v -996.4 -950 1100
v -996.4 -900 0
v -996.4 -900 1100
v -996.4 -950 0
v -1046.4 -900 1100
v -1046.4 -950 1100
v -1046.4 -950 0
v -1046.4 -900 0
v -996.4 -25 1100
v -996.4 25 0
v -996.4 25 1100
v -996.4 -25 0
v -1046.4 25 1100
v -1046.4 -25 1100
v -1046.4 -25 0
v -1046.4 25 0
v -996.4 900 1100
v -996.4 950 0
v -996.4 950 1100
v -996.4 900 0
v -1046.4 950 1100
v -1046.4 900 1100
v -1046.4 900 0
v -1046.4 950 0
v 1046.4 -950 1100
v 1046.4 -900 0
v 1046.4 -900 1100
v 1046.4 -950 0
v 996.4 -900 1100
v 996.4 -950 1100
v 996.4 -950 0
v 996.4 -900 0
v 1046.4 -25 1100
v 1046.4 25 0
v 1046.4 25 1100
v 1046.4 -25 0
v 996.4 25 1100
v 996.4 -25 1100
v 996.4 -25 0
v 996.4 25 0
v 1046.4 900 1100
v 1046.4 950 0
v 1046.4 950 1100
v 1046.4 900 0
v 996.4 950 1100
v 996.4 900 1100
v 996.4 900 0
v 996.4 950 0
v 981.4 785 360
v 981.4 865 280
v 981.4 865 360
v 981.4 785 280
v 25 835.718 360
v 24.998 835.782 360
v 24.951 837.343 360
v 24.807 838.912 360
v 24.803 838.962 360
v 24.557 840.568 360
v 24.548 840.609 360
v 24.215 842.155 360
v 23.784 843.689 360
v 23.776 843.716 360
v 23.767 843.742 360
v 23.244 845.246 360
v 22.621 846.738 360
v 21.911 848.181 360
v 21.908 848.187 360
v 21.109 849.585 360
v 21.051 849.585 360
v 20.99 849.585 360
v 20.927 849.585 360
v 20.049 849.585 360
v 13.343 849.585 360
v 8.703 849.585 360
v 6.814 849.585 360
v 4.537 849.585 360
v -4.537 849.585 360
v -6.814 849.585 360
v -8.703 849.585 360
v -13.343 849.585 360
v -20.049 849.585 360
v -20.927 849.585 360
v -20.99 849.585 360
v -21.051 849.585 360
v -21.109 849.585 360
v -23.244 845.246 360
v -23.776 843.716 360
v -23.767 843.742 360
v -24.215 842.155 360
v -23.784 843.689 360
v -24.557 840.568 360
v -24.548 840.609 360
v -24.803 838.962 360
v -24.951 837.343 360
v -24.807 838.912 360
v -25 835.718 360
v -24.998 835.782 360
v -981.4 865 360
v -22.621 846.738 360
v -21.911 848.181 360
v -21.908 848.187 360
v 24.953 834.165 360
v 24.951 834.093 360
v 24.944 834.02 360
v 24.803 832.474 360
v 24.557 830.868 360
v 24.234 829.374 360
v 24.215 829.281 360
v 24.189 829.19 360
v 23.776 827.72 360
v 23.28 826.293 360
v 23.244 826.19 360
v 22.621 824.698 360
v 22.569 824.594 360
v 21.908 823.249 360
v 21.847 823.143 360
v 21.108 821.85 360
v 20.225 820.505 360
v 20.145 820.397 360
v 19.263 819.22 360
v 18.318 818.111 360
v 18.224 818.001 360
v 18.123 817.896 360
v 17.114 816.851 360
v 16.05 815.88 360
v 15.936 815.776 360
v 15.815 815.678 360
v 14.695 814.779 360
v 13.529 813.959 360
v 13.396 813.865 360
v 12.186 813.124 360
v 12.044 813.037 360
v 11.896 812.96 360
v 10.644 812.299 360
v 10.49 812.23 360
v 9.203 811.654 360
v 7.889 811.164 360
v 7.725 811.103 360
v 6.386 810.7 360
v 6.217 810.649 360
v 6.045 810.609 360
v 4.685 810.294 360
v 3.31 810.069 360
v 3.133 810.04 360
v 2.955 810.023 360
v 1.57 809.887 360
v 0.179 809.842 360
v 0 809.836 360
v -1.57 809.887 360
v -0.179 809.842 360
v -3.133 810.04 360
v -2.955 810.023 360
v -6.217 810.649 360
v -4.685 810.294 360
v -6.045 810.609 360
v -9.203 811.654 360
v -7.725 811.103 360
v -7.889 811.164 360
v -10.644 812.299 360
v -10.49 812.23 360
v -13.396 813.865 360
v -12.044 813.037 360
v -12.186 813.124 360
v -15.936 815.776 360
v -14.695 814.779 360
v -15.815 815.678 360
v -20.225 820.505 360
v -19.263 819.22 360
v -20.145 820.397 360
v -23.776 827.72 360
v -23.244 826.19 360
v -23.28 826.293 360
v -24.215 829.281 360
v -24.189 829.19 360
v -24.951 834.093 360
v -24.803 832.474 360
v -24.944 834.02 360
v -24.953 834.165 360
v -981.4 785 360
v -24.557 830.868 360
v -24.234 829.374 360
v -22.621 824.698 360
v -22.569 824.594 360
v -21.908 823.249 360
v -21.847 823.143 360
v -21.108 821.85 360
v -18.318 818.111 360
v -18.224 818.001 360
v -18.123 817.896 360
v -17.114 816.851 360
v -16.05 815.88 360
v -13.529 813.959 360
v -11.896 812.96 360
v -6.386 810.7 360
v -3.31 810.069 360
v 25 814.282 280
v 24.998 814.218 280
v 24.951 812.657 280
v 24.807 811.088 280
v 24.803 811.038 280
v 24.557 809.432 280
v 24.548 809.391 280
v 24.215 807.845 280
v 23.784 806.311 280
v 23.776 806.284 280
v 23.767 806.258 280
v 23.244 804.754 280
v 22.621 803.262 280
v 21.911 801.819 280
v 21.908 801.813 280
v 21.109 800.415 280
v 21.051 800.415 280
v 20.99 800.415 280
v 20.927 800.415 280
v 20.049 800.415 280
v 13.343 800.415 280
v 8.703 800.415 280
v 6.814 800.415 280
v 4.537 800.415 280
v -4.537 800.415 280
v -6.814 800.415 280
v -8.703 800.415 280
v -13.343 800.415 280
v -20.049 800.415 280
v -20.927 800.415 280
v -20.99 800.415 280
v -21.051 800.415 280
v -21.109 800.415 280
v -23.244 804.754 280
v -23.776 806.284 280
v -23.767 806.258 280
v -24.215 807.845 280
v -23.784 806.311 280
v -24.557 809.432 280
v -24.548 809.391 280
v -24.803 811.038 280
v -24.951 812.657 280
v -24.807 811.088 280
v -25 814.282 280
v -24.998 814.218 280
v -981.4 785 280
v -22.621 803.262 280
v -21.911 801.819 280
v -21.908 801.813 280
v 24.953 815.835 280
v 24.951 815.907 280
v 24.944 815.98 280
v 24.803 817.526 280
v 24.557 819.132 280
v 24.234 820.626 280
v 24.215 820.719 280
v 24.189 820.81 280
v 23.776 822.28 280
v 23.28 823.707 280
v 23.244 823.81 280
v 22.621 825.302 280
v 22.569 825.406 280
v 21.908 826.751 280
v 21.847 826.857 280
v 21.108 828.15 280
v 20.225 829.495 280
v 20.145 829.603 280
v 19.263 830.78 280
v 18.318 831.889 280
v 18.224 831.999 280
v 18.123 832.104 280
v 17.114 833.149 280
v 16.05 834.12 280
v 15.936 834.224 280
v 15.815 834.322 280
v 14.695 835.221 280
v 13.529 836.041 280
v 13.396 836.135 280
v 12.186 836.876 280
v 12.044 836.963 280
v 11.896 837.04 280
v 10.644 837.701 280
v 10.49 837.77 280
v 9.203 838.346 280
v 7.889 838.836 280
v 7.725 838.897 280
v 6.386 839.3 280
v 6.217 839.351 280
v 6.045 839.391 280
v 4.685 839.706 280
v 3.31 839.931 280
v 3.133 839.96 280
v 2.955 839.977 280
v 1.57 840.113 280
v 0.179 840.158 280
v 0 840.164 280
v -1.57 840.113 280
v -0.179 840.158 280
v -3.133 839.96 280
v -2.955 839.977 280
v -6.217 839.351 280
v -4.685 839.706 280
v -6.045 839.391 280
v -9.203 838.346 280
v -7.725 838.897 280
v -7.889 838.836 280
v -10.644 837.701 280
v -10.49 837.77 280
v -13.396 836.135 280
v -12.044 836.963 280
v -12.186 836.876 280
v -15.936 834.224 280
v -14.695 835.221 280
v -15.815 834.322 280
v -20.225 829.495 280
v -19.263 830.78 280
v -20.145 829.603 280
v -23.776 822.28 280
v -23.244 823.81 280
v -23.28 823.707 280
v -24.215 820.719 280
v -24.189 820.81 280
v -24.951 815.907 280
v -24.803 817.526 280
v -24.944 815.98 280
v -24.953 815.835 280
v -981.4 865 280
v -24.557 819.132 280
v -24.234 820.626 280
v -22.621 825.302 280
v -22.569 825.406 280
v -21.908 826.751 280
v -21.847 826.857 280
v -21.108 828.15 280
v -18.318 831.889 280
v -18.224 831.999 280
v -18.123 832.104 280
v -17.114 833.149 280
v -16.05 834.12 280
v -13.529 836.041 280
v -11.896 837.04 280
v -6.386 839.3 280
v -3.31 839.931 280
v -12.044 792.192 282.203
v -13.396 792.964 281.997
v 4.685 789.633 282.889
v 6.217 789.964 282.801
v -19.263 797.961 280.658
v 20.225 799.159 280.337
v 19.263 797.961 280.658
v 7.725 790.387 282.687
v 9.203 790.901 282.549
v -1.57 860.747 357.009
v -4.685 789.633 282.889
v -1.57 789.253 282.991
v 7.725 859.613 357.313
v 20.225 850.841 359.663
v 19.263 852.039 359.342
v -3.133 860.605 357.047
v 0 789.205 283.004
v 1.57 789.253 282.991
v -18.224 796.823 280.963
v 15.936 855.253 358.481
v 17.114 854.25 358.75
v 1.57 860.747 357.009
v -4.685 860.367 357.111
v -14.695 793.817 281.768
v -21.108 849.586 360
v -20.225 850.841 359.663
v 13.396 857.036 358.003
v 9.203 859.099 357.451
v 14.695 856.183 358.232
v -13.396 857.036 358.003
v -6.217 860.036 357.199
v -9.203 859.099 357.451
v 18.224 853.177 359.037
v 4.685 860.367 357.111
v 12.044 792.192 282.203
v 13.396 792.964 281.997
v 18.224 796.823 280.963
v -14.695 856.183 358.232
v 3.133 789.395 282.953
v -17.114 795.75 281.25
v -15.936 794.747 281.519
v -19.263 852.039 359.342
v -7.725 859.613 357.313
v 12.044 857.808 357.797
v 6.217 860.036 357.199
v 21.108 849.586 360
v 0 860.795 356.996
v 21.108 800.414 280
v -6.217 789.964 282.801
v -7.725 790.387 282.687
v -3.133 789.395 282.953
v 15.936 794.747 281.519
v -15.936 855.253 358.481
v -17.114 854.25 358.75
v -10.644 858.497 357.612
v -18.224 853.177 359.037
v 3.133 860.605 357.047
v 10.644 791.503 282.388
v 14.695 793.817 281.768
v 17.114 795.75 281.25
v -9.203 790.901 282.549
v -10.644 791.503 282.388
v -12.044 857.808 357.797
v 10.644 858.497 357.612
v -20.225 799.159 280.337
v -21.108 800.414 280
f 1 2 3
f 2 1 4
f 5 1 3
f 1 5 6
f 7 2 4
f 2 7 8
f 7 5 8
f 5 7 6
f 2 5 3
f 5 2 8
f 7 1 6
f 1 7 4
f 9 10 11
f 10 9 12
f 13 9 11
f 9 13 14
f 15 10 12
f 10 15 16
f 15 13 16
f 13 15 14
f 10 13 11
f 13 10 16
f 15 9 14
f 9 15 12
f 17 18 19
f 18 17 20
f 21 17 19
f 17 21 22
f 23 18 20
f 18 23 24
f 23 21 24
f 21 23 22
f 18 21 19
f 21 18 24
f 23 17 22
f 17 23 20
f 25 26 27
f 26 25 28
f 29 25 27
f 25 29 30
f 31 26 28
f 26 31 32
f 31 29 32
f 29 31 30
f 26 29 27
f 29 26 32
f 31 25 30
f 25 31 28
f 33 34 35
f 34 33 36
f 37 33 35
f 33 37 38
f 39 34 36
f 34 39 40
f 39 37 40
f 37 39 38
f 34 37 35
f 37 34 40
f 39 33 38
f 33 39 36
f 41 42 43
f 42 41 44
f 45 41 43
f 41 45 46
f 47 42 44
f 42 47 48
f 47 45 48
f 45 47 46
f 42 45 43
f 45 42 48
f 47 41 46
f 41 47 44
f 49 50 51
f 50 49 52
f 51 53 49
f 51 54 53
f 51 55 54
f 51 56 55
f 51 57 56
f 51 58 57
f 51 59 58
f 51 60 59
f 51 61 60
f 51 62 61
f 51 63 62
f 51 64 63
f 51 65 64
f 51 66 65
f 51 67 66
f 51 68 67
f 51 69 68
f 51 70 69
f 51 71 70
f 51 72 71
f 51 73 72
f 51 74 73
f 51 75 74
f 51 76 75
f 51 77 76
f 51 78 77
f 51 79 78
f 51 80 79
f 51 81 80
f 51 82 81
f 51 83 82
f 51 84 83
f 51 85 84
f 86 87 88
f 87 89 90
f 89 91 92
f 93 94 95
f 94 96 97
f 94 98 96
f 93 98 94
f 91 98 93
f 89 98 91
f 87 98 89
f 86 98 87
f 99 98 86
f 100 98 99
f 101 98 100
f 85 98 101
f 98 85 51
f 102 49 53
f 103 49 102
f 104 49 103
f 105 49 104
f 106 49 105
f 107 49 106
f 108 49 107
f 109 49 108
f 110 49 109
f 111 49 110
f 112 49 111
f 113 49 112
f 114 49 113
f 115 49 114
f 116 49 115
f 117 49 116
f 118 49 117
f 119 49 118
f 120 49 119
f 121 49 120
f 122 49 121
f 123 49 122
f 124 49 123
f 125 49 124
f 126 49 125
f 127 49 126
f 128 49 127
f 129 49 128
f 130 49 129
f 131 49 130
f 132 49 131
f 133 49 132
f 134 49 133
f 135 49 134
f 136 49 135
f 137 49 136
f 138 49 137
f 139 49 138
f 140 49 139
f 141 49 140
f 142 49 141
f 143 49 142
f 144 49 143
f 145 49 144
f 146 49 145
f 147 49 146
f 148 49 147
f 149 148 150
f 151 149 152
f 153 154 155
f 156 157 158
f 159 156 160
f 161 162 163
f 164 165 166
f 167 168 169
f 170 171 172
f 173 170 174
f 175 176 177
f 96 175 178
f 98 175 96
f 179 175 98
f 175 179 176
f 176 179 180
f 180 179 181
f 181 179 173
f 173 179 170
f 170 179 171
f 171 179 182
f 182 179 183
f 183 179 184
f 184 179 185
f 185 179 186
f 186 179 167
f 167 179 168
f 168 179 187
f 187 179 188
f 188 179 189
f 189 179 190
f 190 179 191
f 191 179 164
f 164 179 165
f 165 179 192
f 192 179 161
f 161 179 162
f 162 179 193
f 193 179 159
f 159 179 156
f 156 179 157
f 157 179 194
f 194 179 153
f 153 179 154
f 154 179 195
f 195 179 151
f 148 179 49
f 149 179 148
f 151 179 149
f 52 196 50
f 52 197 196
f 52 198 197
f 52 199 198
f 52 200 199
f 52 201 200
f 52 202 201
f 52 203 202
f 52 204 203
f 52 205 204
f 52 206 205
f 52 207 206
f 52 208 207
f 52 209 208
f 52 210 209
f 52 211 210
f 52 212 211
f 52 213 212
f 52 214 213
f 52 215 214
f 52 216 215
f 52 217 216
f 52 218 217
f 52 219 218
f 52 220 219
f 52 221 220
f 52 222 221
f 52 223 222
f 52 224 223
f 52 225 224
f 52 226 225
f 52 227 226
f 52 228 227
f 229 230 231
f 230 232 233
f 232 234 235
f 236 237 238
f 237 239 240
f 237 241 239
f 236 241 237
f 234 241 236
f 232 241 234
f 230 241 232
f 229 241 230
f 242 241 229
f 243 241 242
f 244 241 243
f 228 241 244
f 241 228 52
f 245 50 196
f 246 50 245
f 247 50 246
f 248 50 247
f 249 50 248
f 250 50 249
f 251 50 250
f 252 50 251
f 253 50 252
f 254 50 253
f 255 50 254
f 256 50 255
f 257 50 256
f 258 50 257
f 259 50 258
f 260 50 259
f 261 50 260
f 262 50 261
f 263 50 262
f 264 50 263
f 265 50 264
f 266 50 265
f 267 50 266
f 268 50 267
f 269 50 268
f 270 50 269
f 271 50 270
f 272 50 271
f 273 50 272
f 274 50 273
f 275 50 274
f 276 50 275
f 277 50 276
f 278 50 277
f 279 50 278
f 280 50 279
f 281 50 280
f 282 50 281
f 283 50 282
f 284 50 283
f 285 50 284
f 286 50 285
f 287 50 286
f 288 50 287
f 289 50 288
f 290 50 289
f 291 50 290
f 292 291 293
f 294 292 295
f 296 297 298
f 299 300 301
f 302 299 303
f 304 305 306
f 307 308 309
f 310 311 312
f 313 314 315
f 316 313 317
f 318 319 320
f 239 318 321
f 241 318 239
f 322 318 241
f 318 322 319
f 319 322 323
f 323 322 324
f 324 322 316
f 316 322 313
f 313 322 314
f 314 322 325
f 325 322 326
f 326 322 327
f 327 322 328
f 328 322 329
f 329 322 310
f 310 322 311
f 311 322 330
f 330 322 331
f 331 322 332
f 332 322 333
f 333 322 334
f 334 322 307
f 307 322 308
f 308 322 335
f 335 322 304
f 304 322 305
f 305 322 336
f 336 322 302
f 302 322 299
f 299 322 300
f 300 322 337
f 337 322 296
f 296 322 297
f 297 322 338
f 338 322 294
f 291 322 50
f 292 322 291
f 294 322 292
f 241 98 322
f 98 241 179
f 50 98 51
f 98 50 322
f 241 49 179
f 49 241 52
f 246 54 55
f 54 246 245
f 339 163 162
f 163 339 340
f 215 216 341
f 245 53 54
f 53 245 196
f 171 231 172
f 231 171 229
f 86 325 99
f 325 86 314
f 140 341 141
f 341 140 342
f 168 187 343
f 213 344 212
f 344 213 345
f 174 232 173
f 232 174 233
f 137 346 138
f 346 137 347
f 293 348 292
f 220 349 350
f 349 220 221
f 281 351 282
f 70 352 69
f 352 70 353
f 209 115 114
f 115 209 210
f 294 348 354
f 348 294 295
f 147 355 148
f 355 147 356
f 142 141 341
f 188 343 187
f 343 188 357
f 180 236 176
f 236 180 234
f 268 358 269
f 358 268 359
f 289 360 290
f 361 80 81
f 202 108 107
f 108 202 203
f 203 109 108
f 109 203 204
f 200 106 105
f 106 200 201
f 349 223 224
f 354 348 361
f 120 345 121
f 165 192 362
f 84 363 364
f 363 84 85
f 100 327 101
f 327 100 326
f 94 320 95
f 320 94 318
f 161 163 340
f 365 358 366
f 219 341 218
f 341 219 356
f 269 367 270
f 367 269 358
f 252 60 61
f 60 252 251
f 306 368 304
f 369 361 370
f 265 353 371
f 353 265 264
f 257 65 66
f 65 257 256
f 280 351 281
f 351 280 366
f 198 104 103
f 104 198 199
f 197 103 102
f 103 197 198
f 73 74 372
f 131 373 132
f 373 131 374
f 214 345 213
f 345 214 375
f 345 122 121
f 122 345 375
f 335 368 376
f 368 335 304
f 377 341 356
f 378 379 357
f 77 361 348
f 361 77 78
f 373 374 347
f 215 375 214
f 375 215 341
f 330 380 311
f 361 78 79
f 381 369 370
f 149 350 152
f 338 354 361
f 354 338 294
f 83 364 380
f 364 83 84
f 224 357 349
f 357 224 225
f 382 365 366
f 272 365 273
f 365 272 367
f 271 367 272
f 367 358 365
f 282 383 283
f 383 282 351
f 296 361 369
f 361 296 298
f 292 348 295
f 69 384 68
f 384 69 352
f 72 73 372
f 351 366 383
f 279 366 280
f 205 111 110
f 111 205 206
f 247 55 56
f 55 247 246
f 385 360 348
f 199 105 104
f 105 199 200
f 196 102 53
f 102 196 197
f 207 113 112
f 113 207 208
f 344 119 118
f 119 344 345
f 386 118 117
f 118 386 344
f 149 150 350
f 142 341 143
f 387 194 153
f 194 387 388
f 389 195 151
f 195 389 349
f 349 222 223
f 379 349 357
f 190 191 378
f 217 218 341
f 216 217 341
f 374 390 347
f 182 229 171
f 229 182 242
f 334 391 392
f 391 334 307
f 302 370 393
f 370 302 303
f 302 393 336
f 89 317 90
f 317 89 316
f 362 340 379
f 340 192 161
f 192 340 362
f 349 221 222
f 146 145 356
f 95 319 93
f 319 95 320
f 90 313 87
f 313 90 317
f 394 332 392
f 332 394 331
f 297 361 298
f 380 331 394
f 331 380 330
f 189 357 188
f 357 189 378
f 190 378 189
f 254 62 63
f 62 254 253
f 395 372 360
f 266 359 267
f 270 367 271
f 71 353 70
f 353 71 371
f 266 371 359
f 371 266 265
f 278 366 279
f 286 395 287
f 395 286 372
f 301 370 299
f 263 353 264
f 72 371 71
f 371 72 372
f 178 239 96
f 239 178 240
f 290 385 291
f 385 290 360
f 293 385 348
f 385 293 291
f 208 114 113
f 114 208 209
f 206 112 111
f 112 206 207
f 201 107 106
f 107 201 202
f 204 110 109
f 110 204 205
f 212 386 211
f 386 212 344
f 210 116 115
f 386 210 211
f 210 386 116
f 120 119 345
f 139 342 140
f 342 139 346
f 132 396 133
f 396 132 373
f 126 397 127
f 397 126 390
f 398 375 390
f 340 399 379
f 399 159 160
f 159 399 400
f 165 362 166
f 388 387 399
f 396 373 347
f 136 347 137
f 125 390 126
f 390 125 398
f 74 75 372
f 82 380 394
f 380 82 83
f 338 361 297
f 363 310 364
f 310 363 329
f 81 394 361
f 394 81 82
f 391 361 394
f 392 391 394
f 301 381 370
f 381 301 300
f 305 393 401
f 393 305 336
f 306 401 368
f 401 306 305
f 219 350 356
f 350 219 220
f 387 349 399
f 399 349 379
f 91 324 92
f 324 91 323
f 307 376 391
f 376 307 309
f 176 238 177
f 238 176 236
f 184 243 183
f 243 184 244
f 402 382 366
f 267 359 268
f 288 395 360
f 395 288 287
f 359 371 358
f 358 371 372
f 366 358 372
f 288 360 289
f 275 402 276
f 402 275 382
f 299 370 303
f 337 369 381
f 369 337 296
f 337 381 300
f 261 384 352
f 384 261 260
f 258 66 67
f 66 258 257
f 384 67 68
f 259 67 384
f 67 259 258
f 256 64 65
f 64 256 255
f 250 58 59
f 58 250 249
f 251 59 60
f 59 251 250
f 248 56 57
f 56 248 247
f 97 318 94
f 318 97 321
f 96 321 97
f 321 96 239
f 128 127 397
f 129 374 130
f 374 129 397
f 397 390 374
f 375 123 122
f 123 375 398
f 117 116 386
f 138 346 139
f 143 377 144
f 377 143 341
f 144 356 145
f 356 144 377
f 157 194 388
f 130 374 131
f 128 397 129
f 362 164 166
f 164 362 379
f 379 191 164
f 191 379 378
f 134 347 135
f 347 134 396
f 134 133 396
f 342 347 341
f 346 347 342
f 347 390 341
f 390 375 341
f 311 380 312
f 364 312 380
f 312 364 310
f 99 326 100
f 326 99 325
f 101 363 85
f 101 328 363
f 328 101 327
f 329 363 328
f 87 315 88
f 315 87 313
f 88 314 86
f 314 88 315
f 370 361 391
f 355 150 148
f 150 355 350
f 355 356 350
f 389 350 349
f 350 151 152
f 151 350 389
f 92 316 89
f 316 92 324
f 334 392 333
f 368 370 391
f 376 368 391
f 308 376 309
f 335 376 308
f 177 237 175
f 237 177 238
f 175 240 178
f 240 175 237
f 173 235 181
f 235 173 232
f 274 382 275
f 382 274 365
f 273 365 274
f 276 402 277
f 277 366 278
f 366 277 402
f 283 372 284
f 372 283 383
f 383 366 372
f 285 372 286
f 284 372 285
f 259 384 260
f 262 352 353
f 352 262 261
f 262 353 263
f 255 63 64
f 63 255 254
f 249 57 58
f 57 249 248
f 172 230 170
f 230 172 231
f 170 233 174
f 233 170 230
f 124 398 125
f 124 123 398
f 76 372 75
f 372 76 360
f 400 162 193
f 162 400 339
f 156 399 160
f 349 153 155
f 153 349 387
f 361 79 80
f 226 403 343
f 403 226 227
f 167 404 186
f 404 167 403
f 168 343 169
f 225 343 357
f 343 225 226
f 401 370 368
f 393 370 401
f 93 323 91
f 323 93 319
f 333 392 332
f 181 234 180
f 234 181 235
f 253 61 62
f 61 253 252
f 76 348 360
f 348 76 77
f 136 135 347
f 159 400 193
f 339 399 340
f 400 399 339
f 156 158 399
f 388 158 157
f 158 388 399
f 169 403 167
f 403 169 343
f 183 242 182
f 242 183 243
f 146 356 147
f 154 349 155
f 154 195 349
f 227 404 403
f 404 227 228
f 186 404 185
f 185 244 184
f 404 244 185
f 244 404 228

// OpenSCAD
// ====================================================================================
// REVOLUTIONARY TECHNOLOGY COMPANY & UNIVERSITY OF WASHINGTON DEPARTMENT OF PHYSICS
// Subsystem: silverado_md_armored_cab.scad (Heavy Tactical Crew-Cab Cage Base)
// Core Application: 2027-2028 Silverado MD Commercial Fleet Ballistic Capsule
// COMPLIANCE GATE: Maintains absolute 65mm lower open clearance for underbody plates
// Center Origin (0,0,0) = Firewall Structural Interface on the Driveline Axis
// ====================================================================================

$fn = 100; // High-precision CNC milling and heavy-weldment contour depth

// --- Armored Crew-Cab Dimensional Constants (mm) ---
inch_to_mm         = 25.4;
cab_outer_width    = 82.00 * inch_to_mm; // Matches front clip skin boundaries [INDEX]
cab_outer_length   = 1850.00;            // Heavy commercial crew-cab longitudinal bed [INDEX]
armor_plate_thick  = 12.50;              // 1/2" Thick structural Titanium Grade 5 ballistic core
pillar_height_mm   = 1100.00;             // Total vertical cabin height [INDEX]

// Underbody Clearance Rule Compliance [INDEX]
UNDER_ARMOR_CLEARANCE_MM = 65.00;

module structural_ballistic_pillars() {
    echo("COMPILING 2027 SILVERADO MD ARMORED CREW-CAB REINFORCEMENT MATRIX");
    // Main vertical roll-over and anti-intrusion pillar stations (A, B, and C pillars)
    color("DimGrey") {
        for (x_side = [-cab_outer_width/2 + 20, cab_outer_width/2 - 20]) {
            for (y_step = [-cab_outer_length/2, 0, cab_outer_length/2]) {
                translate([x_side, y_step, pillar_height_mm/2])
                    cube([armor_plate_thick * 4, armor_plate_thick * 4, pillar_height_mm], center=true);
            }
        }
    }
}

module reinforced_blast_floor_pan() {
    // Heavy-duty V-hull style deflected blast plates lining the lower cab floor pan bed
    color("DarkSlateGrey") {
        translate([0, 0, -40])
            difference() {
                // Main floor plate raw stock casting
                cube([cab_outer_width - 80, cab_outer_length - 40, armor_plate_thick * 2], center=true);
                
                // Bottom-side clearance relief to protect the 65mm under-armor zone [INDEX]
                translate([0, 0, -armor_plate_thick])
                    cube([cab_outer_width, cab_outer_length + 10, UNDER_ARMOR_CLEARANCE_MM], center=true);
            }
    }
}

module internal_dash_and_steering_braces() {
    // Structural cross-car beam providing zero-deflection mounting ears for the OtterBox console [INDEX]
    color("Silver") {
        translate([0, cab_outer_length/2 - 100, 320]) {
            difference() {
                cube([cab_outer_width - 120, 80, 80], center=true);
                // Center clear pass-through tunnel for the 0.75-inch splined steering column shaft [INDEX]
                rotate([-15, 0, 0])
                    cylinder(d=50.0, h=90, center=true);
            }
        }
    }
}

// --- Composite Armored Cabin Subframe Instantiation ---
union() {
    structural_ballistic_pillars();
    reinforced_blast_floor_pan();
    internal_dash_and_steering_braces();
}
